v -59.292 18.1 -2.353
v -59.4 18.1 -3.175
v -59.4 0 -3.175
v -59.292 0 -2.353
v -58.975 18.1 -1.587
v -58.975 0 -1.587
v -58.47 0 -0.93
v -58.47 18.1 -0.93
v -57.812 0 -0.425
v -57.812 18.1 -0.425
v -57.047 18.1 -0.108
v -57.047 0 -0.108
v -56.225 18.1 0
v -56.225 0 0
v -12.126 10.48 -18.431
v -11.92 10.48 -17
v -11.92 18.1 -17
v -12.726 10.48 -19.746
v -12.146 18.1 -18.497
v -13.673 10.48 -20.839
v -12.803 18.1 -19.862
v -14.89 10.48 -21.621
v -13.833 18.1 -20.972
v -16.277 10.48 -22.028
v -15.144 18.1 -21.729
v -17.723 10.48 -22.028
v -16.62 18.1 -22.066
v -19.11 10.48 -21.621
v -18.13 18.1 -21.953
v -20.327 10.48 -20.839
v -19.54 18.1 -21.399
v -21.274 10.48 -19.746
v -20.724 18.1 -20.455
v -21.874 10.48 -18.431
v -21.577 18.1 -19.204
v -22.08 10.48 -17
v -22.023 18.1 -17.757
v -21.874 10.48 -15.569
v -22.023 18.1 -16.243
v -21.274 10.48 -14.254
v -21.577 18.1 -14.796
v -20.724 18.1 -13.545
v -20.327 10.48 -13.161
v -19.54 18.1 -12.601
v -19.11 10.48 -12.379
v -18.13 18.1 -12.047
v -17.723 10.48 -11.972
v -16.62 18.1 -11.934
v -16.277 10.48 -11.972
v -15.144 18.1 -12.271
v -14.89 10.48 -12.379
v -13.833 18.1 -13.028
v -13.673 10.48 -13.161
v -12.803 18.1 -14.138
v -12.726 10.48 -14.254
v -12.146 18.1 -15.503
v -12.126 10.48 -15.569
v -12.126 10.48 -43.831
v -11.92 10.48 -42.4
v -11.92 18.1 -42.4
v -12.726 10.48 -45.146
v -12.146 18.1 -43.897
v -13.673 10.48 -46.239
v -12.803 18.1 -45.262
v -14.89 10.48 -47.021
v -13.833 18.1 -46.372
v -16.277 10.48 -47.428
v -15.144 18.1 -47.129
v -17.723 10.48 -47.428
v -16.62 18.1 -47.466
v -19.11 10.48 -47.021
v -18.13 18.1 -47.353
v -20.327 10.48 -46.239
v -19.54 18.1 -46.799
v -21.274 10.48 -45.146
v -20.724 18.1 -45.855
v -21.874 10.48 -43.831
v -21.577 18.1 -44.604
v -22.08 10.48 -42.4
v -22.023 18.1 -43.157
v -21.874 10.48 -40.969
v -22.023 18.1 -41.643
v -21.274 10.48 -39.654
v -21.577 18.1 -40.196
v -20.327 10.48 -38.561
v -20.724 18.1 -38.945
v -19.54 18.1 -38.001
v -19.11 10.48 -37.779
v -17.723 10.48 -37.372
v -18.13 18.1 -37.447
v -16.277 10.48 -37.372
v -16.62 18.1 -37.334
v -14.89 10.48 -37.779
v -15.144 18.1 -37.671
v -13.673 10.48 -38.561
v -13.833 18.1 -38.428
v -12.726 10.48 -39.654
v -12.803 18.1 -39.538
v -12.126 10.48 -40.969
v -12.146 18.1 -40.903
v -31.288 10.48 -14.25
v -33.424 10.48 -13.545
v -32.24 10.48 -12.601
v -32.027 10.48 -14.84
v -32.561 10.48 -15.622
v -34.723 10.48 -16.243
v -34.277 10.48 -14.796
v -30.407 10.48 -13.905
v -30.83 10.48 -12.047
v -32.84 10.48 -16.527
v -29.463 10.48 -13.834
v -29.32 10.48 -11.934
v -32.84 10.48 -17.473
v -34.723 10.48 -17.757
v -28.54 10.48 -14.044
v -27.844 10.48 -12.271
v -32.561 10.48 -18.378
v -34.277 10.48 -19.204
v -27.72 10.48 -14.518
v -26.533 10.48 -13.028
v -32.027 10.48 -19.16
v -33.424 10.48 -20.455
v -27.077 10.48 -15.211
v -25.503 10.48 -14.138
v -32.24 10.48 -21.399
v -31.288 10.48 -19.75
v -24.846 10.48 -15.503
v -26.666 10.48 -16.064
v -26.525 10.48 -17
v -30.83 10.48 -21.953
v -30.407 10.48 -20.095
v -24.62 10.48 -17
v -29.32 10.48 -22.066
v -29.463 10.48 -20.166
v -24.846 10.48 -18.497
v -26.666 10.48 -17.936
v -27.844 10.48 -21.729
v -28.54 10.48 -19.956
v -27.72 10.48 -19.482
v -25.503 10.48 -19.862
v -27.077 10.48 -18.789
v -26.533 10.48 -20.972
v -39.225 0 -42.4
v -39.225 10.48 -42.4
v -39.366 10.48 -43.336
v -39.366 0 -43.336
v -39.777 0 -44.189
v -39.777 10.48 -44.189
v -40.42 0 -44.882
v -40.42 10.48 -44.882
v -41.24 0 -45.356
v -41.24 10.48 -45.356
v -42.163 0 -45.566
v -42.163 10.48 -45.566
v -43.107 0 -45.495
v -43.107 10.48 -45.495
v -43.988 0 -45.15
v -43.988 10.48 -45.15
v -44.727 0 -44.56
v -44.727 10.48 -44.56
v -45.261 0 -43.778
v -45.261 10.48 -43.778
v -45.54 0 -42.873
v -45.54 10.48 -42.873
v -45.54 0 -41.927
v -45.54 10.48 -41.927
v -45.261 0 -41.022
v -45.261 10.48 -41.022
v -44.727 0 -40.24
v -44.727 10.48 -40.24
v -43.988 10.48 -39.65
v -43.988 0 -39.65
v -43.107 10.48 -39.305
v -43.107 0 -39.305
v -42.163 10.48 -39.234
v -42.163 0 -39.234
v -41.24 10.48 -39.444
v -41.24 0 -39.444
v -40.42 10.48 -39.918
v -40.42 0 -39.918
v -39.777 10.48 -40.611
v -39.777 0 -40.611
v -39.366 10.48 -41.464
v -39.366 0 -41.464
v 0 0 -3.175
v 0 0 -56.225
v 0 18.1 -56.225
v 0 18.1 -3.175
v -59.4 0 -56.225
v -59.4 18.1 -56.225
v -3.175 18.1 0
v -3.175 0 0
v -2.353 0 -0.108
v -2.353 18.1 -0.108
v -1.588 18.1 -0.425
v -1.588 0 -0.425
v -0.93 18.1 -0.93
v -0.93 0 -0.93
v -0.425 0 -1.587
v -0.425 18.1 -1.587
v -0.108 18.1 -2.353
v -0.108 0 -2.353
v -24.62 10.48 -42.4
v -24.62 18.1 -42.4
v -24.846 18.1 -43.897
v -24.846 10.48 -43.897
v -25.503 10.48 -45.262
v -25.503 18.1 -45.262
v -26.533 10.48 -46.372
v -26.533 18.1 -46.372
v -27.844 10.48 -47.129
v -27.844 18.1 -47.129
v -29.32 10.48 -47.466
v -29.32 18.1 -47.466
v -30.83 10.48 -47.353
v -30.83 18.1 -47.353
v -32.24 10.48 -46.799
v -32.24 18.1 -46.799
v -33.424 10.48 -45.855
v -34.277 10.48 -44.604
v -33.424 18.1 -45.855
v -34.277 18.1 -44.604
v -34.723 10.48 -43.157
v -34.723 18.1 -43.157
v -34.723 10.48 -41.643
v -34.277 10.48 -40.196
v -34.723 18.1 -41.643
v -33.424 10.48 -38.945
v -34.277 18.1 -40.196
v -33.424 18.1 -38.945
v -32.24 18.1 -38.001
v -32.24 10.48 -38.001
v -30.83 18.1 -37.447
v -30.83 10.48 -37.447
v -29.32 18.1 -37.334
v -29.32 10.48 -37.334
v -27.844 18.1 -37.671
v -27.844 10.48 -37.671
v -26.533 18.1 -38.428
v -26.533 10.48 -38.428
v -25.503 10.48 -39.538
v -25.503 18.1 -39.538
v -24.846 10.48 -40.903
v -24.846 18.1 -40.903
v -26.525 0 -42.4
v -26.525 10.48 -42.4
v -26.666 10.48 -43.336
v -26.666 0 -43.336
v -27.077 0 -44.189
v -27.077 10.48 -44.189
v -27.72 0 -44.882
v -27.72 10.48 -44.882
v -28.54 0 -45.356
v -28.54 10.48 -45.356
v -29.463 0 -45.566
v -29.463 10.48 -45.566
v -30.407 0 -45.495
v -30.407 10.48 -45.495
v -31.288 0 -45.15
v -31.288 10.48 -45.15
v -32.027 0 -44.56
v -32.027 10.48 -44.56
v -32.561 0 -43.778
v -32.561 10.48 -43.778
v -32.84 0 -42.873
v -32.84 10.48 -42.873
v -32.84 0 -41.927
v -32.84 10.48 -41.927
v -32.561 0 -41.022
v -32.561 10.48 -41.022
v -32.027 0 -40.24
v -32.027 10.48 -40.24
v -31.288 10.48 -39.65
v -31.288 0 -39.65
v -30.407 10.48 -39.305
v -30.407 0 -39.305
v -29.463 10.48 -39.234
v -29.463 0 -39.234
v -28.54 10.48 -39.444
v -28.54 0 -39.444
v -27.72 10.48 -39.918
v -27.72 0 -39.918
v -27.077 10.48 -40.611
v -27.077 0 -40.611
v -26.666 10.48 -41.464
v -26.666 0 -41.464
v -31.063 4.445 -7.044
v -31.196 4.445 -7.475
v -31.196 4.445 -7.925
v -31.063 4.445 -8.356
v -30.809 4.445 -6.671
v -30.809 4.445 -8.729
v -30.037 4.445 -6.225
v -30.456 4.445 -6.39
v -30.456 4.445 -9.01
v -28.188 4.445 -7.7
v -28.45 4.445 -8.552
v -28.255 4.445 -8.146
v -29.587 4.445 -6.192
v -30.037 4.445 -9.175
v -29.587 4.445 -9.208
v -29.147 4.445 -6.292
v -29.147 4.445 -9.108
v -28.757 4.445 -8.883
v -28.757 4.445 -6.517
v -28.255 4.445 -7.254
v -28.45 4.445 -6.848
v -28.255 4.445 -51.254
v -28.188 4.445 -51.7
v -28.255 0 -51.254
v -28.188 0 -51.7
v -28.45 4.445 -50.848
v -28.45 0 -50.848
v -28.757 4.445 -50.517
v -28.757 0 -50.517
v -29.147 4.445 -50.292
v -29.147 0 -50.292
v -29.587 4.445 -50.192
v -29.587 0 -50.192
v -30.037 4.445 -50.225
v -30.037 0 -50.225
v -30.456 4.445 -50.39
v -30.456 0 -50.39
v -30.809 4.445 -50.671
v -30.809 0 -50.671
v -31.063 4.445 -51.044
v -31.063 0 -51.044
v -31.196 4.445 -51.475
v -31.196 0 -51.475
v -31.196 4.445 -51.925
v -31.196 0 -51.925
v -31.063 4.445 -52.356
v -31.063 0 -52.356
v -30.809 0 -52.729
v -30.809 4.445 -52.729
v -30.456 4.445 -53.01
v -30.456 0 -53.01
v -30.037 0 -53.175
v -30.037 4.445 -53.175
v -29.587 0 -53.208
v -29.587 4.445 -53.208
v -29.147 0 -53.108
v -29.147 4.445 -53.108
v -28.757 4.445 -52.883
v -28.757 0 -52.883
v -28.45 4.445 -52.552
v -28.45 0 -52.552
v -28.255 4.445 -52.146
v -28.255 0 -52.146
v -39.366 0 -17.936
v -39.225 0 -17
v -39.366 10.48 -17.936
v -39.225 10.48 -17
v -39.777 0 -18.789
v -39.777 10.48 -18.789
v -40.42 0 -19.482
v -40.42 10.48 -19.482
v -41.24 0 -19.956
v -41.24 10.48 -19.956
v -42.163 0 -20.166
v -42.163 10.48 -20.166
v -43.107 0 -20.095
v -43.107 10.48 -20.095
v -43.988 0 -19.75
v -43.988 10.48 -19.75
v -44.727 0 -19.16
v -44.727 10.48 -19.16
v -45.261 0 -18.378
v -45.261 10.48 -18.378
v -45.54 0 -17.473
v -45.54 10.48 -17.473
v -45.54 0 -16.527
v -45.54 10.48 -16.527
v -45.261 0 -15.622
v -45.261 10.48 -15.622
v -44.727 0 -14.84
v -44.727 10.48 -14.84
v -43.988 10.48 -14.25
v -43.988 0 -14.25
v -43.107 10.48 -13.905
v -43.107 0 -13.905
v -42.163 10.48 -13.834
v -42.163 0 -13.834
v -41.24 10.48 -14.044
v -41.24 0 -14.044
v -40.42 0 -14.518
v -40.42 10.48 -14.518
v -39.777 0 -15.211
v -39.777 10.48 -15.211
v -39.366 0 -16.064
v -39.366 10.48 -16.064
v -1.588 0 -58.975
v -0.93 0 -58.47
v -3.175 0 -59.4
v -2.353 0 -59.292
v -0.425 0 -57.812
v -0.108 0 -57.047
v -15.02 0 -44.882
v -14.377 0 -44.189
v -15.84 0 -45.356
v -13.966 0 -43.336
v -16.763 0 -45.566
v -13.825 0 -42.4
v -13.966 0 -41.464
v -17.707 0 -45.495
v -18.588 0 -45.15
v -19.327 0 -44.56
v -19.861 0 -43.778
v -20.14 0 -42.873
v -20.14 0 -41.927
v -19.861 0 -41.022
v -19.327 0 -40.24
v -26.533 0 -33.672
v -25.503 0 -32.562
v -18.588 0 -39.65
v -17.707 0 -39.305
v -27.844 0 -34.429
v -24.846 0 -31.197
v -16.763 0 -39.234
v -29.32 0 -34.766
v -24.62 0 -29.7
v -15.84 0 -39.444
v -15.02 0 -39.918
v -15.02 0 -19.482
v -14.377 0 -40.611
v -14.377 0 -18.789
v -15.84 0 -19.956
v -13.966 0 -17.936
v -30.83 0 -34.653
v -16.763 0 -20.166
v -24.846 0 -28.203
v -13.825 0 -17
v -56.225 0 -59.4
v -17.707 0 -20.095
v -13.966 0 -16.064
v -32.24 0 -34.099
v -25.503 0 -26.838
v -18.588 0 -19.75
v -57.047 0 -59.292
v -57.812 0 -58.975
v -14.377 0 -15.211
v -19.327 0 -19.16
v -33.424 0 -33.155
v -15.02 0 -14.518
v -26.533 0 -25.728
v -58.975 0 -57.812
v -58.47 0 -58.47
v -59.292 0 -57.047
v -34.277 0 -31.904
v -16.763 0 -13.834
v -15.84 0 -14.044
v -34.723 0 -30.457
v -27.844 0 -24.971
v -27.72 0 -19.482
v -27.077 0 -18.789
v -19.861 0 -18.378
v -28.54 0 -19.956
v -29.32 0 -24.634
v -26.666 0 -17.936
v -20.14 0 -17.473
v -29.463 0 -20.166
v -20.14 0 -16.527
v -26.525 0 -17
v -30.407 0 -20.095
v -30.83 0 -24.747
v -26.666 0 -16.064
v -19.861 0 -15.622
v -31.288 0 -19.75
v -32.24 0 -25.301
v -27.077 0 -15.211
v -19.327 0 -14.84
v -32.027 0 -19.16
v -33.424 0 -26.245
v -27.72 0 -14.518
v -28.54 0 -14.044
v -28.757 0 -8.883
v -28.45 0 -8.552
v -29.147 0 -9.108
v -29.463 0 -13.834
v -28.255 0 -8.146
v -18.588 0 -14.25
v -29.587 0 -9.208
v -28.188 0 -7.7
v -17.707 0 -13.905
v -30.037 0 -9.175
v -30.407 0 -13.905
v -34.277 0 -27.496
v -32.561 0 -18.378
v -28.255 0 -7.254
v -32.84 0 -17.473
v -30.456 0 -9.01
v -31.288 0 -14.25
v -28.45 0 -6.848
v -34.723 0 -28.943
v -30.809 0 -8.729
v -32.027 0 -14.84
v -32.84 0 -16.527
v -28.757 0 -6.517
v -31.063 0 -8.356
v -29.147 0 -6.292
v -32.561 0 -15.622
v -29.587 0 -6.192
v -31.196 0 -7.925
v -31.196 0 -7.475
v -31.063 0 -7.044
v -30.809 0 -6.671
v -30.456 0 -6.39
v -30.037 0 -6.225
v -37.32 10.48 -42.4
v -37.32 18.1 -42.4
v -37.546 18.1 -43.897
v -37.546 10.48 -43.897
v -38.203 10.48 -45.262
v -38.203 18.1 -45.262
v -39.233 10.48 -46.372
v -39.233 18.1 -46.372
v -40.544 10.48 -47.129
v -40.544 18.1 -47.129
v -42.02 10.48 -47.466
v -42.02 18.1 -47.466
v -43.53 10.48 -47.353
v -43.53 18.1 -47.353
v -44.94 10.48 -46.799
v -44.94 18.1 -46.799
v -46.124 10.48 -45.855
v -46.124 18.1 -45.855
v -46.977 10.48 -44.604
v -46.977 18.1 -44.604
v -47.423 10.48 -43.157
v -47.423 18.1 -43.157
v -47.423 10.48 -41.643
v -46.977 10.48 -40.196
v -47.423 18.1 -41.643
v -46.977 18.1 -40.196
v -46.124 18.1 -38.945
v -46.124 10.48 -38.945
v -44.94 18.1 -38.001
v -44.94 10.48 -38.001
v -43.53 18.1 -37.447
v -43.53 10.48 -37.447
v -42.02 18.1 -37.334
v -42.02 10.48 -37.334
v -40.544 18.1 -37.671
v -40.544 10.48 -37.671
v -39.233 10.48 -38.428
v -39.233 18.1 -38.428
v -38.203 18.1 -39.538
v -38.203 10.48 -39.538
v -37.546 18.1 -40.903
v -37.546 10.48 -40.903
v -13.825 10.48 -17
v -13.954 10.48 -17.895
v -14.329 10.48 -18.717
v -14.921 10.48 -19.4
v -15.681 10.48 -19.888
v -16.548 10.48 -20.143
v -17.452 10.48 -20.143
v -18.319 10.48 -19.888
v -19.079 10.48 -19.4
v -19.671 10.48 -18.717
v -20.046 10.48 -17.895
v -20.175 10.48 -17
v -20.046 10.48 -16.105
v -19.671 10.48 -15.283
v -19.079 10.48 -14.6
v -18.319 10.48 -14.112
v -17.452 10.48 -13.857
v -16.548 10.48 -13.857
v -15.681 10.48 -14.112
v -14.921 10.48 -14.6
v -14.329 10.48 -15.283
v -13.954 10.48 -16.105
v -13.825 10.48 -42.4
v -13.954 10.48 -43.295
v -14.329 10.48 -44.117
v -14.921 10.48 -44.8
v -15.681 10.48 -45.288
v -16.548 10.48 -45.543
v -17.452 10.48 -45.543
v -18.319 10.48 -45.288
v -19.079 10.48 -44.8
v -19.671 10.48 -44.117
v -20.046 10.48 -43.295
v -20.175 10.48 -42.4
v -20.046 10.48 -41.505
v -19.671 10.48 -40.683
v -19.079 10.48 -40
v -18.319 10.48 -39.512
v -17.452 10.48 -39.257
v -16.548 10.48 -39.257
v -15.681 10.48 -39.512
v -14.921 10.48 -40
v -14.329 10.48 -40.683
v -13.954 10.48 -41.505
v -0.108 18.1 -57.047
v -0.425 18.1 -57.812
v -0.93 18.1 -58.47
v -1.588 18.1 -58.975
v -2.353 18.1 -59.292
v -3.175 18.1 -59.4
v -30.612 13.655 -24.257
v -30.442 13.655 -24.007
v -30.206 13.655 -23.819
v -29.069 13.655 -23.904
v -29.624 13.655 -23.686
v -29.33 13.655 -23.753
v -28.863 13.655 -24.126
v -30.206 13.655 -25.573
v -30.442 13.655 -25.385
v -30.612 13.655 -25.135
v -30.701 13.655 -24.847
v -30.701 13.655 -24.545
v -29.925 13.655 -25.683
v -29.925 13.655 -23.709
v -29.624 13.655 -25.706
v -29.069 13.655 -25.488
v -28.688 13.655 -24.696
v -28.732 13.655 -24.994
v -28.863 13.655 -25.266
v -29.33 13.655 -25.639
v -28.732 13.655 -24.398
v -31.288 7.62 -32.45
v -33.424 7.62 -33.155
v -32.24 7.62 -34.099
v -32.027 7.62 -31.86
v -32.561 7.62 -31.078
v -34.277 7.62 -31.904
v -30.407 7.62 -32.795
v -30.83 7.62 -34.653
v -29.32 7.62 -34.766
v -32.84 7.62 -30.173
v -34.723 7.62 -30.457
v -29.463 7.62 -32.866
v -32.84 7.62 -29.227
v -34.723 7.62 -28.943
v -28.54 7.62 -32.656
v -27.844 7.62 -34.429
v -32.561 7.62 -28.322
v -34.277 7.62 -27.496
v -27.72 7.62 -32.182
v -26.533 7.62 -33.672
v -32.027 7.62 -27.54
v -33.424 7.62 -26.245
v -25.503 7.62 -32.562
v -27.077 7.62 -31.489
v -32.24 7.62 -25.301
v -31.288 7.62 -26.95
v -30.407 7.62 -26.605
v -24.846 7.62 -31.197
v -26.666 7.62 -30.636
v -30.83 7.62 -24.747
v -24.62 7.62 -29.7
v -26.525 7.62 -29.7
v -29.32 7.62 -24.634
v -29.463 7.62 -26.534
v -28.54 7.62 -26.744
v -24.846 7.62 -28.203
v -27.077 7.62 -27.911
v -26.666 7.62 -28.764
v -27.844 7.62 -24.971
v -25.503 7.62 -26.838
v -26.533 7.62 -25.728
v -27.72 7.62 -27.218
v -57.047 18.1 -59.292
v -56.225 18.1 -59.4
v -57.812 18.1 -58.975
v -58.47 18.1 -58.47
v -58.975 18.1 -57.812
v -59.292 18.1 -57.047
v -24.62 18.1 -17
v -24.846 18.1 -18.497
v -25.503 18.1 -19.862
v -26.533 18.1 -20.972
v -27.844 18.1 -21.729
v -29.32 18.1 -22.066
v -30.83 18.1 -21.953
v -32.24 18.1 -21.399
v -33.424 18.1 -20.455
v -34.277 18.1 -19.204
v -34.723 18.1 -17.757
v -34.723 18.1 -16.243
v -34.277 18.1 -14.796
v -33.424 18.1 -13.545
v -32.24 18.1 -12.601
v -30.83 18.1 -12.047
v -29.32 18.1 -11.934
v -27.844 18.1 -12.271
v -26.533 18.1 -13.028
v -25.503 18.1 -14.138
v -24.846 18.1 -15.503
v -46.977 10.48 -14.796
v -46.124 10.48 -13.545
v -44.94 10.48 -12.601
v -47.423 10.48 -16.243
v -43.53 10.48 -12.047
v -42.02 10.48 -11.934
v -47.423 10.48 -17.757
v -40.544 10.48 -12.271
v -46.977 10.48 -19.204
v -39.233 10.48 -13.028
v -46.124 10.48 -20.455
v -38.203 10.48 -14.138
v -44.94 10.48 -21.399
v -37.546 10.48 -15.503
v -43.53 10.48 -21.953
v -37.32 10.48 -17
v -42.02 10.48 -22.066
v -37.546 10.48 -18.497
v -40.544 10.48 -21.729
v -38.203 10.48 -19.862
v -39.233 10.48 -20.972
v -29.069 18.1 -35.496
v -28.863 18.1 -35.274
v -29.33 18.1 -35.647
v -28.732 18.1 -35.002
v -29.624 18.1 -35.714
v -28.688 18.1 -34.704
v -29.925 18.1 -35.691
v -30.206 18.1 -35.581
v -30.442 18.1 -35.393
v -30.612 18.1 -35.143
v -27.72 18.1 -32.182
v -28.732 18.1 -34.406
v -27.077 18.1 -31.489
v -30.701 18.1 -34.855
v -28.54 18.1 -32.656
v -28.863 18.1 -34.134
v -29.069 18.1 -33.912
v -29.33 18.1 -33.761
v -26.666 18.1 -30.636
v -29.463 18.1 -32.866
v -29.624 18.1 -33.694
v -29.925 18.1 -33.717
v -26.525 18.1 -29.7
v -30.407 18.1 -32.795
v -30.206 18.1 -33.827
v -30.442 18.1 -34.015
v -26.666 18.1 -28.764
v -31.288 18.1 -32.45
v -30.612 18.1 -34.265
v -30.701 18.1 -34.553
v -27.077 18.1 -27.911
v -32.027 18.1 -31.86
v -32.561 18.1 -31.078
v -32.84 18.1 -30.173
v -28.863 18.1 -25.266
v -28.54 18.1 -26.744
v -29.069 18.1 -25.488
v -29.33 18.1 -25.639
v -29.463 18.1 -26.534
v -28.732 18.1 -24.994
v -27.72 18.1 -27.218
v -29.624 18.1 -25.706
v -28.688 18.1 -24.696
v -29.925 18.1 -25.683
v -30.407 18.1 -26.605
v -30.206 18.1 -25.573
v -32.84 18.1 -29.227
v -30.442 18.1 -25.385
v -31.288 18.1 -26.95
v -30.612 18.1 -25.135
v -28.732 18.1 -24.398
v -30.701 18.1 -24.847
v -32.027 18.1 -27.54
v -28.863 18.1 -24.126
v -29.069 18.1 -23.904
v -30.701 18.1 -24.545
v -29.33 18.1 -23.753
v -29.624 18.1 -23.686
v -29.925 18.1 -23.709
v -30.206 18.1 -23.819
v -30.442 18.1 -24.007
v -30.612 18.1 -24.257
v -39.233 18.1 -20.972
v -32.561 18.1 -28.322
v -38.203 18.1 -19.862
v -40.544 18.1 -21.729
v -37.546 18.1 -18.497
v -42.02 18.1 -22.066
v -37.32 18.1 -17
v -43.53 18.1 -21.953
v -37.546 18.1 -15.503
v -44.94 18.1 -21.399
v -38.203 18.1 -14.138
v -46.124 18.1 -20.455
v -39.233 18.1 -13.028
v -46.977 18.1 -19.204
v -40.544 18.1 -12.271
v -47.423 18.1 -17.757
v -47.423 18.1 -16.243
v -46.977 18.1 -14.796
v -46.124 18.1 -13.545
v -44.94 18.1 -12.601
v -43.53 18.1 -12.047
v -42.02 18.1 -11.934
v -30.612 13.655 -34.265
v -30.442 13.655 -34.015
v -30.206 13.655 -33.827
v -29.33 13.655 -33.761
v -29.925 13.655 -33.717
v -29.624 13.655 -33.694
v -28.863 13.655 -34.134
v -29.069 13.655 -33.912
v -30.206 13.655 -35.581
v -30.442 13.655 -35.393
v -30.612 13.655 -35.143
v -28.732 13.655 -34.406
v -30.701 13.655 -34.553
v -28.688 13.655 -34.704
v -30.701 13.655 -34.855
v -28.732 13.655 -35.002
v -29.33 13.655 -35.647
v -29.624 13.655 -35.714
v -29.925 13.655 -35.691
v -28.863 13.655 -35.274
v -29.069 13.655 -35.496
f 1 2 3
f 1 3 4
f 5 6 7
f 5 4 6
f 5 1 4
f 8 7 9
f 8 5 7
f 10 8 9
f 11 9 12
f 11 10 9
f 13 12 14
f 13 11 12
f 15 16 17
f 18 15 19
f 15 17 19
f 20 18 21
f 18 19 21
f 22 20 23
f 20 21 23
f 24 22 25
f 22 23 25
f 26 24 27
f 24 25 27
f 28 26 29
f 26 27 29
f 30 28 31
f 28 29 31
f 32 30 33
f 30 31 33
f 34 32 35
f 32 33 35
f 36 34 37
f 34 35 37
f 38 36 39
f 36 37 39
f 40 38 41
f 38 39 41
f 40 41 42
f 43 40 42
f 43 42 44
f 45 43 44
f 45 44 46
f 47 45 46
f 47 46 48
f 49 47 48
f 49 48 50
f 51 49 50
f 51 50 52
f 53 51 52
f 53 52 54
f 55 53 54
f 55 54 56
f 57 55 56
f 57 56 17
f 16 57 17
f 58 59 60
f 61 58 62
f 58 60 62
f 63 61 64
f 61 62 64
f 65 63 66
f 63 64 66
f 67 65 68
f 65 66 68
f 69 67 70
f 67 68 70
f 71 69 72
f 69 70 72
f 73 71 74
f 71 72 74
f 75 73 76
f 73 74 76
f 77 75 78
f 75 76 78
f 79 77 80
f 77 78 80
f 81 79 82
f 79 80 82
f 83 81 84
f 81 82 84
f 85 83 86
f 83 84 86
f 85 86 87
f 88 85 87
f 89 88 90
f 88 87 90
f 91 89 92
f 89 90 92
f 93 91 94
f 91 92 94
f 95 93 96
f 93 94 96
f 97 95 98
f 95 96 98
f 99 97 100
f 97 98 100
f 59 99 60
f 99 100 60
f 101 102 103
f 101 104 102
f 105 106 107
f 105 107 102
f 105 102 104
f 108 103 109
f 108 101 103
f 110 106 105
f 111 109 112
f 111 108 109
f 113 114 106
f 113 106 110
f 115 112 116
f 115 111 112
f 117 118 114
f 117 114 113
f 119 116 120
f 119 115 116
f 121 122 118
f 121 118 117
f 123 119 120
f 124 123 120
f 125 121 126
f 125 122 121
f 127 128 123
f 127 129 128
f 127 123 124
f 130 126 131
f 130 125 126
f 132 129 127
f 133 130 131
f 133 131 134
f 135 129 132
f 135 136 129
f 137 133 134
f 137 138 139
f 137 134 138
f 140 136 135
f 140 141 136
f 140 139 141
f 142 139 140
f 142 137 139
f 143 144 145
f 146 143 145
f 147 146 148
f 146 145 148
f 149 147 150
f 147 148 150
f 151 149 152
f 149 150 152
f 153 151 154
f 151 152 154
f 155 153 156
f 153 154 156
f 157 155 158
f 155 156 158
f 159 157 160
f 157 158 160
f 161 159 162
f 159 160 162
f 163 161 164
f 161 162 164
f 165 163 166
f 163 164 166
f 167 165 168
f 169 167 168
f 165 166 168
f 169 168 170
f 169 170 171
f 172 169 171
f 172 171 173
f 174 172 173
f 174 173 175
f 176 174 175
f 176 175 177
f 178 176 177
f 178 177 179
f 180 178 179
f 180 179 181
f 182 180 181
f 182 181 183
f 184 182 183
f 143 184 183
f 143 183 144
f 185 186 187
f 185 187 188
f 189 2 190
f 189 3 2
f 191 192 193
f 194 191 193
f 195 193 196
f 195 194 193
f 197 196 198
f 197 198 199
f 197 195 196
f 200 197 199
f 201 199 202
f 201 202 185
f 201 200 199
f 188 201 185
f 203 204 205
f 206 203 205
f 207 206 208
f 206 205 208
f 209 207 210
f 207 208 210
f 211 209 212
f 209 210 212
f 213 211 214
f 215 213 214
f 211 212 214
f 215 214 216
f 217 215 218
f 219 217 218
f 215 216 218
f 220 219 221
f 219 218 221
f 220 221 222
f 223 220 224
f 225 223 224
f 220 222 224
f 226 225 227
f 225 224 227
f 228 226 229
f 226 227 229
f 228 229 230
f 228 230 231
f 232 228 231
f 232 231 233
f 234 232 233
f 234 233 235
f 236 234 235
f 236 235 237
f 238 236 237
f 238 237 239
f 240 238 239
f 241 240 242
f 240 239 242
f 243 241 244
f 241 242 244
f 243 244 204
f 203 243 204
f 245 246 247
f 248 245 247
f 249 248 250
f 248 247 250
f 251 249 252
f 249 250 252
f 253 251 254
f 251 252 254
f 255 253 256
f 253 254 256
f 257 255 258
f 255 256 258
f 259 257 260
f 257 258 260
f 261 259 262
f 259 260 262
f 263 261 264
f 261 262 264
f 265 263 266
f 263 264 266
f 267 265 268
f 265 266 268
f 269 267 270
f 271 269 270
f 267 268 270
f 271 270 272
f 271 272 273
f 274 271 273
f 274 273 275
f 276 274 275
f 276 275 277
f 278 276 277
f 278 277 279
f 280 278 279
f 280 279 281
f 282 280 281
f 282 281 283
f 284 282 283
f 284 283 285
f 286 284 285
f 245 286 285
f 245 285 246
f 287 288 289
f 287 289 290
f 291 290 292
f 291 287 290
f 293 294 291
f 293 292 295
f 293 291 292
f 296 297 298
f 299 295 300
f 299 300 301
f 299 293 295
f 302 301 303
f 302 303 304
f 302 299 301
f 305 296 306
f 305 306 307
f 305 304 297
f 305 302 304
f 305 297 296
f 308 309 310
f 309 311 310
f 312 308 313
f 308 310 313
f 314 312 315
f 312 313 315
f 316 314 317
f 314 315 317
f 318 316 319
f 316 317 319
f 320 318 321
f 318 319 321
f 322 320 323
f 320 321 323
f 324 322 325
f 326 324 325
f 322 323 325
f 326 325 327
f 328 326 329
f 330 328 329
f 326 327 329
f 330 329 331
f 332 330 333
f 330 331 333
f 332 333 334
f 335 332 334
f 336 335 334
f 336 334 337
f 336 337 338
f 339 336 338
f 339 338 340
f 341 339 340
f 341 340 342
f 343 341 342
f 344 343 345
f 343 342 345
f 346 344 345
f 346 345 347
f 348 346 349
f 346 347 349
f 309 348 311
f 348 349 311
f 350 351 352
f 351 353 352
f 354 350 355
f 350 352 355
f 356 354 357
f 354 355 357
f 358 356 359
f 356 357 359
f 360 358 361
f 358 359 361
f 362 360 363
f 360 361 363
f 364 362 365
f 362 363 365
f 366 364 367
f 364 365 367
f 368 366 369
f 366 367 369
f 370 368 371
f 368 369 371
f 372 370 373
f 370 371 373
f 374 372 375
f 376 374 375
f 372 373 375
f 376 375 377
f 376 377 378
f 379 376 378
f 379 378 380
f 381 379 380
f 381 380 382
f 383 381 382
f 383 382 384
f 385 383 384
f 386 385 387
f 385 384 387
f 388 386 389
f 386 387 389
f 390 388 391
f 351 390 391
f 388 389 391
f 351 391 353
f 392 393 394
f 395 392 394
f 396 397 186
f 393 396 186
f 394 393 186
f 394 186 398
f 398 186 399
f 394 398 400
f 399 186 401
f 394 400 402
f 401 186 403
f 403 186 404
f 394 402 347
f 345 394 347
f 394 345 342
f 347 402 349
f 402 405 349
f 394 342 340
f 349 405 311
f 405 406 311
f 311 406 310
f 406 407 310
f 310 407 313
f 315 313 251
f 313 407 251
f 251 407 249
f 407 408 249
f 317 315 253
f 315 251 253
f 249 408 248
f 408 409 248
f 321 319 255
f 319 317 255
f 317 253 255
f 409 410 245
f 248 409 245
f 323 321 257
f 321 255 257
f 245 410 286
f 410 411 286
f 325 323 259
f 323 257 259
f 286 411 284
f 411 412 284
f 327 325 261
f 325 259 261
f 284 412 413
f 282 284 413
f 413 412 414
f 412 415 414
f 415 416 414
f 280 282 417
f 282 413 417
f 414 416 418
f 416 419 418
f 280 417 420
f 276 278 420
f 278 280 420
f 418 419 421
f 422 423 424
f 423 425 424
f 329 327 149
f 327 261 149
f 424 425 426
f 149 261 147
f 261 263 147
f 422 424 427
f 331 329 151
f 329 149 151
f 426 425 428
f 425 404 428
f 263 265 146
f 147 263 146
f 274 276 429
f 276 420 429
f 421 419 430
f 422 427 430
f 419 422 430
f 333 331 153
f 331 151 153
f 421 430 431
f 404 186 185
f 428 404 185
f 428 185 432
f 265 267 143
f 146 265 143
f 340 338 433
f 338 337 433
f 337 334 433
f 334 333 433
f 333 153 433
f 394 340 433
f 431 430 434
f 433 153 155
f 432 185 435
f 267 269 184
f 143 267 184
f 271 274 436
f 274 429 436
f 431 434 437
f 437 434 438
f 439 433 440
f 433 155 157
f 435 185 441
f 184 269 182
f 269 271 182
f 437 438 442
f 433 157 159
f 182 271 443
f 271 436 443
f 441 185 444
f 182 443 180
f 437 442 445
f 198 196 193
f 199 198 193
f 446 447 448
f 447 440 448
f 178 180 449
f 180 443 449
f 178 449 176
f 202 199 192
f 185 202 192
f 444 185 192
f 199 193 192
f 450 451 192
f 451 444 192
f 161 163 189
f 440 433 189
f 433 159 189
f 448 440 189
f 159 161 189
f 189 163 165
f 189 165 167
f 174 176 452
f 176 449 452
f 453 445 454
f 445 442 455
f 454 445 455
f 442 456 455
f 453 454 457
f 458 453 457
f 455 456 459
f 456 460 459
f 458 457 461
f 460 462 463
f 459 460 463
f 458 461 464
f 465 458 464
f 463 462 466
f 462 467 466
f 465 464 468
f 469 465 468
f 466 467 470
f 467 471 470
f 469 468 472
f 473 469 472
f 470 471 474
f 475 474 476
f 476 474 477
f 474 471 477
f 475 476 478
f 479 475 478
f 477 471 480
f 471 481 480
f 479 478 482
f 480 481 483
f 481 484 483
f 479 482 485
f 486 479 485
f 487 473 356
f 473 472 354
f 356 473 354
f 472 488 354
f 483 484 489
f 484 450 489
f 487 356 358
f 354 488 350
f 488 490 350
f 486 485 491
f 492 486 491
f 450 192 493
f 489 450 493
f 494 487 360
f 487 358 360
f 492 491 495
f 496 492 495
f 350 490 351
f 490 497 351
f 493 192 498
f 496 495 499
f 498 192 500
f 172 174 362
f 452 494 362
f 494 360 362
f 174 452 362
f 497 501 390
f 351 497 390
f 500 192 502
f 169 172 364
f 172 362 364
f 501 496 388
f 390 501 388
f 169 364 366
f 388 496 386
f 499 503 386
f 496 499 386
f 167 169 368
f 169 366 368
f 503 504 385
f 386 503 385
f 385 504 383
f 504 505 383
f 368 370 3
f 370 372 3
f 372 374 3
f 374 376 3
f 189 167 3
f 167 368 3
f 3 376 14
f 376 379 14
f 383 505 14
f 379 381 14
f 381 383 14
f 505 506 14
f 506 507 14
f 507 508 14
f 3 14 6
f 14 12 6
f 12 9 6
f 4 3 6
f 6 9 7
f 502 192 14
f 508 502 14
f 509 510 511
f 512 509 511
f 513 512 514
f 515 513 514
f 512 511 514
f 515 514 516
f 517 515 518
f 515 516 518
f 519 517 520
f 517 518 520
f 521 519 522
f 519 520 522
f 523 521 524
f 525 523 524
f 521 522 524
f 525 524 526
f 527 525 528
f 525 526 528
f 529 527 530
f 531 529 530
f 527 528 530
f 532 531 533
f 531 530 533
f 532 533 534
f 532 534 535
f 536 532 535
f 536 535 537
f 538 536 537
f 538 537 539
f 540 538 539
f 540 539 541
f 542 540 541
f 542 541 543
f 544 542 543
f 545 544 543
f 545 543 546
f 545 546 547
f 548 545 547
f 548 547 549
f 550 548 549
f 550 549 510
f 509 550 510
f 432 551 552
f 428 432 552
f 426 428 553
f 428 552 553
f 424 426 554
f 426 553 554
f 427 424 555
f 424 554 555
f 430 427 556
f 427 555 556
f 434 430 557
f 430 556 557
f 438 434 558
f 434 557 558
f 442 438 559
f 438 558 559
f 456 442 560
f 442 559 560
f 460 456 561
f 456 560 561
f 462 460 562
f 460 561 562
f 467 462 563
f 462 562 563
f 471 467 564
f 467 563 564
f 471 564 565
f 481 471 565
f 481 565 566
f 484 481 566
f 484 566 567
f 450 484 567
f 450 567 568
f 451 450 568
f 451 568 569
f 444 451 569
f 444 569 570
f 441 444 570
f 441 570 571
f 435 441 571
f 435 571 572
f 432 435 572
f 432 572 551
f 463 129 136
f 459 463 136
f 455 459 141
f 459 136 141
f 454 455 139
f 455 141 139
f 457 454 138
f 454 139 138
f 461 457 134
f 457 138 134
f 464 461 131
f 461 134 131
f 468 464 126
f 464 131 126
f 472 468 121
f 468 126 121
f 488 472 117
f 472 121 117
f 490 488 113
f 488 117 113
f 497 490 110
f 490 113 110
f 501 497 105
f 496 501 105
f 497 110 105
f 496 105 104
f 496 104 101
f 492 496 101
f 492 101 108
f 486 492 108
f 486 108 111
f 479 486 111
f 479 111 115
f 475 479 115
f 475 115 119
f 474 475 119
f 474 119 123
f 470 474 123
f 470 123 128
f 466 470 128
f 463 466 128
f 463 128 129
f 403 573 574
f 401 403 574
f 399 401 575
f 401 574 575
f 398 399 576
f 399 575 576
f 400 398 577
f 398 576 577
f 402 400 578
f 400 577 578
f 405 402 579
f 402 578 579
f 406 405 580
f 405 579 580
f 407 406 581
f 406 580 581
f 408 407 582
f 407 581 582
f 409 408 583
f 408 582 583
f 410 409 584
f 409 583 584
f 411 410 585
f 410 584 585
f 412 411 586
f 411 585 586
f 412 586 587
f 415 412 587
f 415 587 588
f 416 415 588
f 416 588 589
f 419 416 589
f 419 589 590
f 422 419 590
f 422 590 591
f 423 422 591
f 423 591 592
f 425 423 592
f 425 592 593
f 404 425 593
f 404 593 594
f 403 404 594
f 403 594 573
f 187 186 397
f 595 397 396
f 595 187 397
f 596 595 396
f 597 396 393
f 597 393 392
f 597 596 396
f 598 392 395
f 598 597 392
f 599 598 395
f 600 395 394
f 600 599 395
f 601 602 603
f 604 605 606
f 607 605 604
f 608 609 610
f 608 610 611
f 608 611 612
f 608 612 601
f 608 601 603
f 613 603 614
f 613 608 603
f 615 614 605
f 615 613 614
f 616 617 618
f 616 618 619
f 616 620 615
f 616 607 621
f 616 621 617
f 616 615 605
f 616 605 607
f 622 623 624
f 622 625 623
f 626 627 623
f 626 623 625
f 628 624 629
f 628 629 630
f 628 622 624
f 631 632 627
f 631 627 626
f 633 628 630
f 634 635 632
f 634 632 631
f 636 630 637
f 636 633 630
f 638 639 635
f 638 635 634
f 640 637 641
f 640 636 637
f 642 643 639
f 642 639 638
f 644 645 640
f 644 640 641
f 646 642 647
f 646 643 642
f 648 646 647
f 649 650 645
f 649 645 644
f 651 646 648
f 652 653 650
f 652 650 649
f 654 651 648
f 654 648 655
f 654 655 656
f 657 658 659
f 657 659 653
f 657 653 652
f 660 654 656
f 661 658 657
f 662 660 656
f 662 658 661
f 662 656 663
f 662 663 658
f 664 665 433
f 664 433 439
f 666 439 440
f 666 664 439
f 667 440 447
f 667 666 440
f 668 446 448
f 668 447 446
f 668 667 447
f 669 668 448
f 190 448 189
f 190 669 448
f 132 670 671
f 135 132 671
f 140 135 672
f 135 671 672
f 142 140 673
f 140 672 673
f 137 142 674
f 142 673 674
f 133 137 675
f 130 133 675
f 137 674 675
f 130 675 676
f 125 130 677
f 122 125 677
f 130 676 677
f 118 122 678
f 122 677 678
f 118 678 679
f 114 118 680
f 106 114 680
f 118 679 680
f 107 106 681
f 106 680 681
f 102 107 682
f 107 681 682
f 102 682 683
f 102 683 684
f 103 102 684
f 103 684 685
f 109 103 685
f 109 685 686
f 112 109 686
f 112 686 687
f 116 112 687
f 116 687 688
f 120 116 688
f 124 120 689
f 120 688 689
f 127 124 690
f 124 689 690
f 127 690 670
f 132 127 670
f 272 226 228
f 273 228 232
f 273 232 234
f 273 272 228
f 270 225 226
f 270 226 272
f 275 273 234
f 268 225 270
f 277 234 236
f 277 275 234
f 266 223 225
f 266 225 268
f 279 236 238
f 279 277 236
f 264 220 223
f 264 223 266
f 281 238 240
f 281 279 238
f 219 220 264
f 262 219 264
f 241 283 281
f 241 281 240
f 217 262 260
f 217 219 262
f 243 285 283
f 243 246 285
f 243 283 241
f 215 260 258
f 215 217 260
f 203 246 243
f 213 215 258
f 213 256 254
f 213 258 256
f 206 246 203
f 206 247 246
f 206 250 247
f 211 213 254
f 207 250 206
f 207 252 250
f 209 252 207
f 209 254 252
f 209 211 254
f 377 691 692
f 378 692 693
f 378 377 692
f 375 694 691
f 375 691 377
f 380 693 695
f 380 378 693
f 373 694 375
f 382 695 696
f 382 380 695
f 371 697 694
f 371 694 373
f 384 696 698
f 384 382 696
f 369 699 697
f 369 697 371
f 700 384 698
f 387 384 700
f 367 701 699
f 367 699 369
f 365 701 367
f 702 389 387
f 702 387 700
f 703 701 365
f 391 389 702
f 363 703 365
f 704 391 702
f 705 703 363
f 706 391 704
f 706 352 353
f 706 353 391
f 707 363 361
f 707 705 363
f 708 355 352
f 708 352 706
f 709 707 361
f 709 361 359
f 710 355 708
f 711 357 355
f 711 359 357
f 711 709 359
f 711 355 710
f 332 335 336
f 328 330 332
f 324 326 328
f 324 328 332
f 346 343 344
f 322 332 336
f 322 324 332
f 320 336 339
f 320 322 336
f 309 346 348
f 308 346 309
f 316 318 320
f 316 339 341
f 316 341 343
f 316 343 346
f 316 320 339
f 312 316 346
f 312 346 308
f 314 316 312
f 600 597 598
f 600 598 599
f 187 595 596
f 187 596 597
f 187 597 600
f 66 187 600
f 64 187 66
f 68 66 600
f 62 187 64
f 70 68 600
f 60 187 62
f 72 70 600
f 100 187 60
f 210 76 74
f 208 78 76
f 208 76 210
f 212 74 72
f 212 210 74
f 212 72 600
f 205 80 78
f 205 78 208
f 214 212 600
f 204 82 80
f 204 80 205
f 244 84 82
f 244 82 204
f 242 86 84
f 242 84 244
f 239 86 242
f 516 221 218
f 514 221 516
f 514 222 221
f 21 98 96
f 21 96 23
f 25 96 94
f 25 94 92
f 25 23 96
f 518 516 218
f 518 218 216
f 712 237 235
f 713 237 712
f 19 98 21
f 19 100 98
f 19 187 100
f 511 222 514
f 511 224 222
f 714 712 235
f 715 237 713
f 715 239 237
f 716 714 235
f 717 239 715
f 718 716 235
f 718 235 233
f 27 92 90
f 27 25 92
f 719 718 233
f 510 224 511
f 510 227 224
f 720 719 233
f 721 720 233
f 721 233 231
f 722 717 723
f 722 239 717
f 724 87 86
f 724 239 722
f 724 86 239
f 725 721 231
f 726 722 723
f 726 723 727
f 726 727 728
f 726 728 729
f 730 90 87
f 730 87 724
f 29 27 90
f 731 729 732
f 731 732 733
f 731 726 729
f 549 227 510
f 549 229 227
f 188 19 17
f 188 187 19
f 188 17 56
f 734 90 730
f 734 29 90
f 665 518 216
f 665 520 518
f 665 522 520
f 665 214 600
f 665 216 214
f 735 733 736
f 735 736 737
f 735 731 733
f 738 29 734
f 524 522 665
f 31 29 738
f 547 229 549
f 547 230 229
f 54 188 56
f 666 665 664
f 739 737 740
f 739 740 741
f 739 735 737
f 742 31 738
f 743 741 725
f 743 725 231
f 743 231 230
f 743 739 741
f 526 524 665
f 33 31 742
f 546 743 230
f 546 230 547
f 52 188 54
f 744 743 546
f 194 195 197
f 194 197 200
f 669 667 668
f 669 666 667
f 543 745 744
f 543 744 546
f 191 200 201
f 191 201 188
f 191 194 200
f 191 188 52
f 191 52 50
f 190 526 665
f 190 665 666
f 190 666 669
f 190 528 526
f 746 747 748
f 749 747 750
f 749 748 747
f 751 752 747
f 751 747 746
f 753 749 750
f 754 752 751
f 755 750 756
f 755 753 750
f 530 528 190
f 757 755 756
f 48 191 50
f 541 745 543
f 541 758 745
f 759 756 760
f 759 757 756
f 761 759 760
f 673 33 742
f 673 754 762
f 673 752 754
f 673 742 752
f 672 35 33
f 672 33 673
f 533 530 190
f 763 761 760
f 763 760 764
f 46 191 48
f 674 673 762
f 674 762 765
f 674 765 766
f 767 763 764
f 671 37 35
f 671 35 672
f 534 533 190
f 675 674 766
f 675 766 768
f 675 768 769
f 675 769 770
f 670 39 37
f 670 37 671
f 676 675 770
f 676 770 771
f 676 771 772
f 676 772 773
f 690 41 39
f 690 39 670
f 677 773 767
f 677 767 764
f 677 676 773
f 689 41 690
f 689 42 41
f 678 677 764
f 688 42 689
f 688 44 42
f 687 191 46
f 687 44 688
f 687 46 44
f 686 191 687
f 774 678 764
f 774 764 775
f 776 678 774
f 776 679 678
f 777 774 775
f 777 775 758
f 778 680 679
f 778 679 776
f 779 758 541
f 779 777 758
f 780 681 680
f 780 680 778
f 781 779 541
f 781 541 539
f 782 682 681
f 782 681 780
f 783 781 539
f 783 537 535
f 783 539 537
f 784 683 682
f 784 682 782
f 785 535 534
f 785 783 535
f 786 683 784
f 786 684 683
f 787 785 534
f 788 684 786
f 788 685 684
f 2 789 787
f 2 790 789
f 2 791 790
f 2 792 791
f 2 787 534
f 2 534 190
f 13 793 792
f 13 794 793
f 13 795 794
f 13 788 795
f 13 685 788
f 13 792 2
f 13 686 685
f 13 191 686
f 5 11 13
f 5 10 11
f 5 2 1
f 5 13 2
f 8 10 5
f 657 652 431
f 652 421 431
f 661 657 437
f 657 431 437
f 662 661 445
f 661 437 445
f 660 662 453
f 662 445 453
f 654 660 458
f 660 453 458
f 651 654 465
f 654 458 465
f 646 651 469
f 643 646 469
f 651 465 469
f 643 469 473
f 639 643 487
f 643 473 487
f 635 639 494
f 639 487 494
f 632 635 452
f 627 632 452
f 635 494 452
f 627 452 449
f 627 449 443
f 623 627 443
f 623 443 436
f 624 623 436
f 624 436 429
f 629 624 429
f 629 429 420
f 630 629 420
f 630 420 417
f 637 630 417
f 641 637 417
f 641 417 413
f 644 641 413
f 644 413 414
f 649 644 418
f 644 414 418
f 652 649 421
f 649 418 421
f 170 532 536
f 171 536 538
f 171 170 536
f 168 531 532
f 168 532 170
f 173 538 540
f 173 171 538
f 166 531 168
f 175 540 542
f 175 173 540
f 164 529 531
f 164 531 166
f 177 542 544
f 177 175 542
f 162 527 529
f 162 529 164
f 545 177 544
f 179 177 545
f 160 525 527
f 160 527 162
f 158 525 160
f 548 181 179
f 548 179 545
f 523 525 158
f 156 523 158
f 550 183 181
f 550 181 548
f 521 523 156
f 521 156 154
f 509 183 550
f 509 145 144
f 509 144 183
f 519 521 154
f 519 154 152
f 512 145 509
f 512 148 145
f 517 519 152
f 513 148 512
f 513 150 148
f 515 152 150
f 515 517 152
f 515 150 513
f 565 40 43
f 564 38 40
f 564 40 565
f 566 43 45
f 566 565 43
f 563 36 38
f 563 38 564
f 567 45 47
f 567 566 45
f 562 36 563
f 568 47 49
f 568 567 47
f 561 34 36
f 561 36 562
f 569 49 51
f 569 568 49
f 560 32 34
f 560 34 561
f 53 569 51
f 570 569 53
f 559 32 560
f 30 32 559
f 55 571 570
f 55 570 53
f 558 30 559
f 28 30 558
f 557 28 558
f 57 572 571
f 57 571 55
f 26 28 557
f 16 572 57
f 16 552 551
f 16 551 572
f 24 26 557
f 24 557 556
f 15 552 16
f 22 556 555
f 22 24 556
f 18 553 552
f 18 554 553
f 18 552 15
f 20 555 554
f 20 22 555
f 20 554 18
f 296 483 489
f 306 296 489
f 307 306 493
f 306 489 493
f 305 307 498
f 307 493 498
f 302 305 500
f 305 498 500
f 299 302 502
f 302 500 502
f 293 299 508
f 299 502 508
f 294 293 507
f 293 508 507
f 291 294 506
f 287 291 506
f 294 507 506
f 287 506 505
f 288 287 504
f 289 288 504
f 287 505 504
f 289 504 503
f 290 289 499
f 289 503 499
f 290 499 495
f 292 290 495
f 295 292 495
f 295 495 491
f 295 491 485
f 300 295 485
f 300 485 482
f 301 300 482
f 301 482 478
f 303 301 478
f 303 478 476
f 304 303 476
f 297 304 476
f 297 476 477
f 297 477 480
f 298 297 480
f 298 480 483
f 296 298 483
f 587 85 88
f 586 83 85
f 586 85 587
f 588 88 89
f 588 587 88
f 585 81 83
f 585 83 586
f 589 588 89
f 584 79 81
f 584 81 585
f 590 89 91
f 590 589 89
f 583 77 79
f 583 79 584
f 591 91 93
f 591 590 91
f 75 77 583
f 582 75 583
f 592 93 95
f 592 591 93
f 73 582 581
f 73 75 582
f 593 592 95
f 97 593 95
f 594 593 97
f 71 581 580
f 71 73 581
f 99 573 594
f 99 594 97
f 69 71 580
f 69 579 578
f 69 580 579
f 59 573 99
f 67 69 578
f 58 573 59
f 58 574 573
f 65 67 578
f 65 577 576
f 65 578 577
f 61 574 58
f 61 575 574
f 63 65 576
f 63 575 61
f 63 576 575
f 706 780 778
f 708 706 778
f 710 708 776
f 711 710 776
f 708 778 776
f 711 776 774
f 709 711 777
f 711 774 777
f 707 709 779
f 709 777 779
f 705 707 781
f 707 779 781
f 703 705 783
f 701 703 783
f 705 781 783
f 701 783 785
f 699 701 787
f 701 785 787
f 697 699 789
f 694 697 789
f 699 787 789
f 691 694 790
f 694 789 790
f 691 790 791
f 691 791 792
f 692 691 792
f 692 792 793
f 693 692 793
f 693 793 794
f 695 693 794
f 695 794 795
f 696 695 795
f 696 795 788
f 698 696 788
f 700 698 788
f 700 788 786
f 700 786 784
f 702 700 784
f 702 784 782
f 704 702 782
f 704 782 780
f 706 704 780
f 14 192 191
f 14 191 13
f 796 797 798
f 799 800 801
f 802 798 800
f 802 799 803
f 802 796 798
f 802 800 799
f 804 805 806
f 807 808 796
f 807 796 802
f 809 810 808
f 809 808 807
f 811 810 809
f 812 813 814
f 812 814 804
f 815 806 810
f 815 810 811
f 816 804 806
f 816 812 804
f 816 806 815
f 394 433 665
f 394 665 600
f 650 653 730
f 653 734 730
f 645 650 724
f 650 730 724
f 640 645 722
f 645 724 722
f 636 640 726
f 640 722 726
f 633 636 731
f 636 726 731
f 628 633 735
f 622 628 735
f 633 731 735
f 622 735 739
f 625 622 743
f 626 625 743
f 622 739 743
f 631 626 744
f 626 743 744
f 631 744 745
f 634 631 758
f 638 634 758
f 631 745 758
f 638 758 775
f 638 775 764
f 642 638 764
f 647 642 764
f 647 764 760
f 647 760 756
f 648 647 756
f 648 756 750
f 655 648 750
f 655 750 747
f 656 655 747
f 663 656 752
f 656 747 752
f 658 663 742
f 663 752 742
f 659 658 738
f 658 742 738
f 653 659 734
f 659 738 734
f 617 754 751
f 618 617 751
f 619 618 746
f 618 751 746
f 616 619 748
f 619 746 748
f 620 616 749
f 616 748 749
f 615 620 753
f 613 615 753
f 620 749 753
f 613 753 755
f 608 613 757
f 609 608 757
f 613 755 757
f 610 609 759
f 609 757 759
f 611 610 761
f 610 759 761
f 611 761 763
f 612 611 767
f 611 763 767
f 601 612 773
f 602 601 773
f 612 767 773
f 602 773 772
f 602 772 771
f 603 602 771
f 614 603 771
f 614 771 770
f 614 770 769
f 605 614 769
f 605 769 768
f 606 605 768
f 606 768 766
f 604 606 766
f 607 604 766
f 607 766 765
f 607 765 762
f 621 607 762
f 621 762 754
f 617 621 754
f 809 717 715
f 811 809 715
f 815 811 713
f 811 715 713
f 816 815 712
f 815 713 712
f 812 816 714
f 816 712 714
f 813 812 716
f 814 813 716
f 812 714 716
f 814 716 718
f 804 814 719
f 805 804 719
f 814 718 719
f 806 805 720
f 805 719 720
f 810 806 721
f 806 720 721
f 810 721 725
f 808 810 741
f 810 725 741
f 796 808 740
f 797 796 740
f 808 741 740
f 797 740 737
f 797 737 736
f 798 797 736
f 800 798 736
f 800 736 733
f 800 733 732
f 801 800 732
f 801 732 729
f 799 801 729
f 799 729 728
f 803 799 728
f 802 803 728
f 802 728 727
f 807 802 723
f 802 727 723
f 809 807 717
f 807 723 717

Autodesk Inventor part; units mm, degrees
ref_plane "YZ Plane" through (0, 0, 0) normal (1, 0, 0) x (0, 1, 0)
ref_plane "XZ Plane" through (0, 0, 0) normal (0, 1, 0) x (-1, 0, 0)
ref_plane "XY Plane" through (0, 0, 0) normal (0, 0, 1) x (1, 0, 0)
sketch "Sketch1" plane through (0, 0, 0) normal (0, 1, 0) x (-1, 0, 0)
  line L0 (0, 0) -> (59.4, 0)
  line L1 (59.4, 0) -> (59.4, -59.4)
  line L2 (59.4, -59.4) -> (0, -59.4)
  line L3 (0, -59.4) -> (0, 0)
  dimension "d0" = 59.4
  dimension "d1" = 59.4
extrude "Extrusion1" add sketch "Sketch1" along normal blind 18.1
sketch "Sketch2" plane through (0, 18.1, 0) normal (0, 1, 0) x (1, 0, 0)
  line L0 (-59.4, 59.4) -> (-59.4, 0) projected
  line L1 (-59.4, 29.7) -> (0, 29.7)
  line L2 (-29.7, 29.7) -> (-29.7, 59.4)
  line L3 (-29.7, 29.7) -> (-29.7, 17)
  circle A0 centre (-29.7, 17) radius 5.08
  line L4 (-29.7, 17) -> (-42.4, 17)
  line L5 (-29.7, 17) -> (-17, 17)
  circle A1 centre (-42.4, 17) radius 5.08
  circle A2 centre (-17, 17) radius 5.08
  line L6 (-29.7, 29.7) -> (-29.7, 42.4)
  circle A3 centre (-29.7, 42.4) radius 5.08
  line L7 (-29.7, 42.4) -> (-42.4, 42.4)
  line L8 (-29.7, 42.4) -> (-17, 42.4)
  circle A4 centre (-42.4, 42.4) radius 5.08
  circle A5 centre (-17, 42.4) radius 5.08
  circle A6 centre (-29.7, 17) radius 3.175
  circle A7 centre (-42.4, 17) radius 3.175
  circle A8 centre (-17, 17) radius 3.175
  circle A9 centre (-29.7, 42.4) radius 3.175
  circle A10 centre (-42.4, 42.4) radius 3.175
  circle A11 centre (-17, 42.4) radius 3.175
  circle A12 centre (-29.7, 29.7) radius 3.175
  line L9 (-29.7, 29.7) -> (-29.7, 34.704)
  line L10 (-29.7, 29.7) -> (-29.7, 24.696)
  circle A13 centre (-29.7, 24.696) radius 1.0125
  circle A14 centre (-29.7, 34.704) radius 1.0125
  point P0 (0, 0)
  dimension "d4" = 12.7
  dimension "d5" = 10.16
  dimension "d6" = 12.7
  dimension "d7" = 12.7
  dimension "d8" = 10.16
  dimension "d9" = 10.16
  dimension "d10" = 12.7
  dimension "d11" = 10.16
  dimension "d12" = 12.7
  dimension "d13" = 12.7
  dimension "d14" = 10.16
  dimension "d15" = 10.16
  dimension "d16" = 6.35
  dimension "d17" = 6.35
  dimension "d18" = 6.35
  dimension "d19" = 6.35
  dimension "d20" = 6.35
  dimension "d21" = 6.35
  dimension "d22" = 6.35
  dimension "d23" = 5.004
  dimension "d24" = 5.004
  dimension "d25" = 2.025
  dimension "d26" = 2.025
extrude "Extrusion2" cut sketch "Sketch2" against normal blind 38.1 contours L2 A12 L1 | L3 A12 L1 | L1 A12 L2 | L1 A12 L3 | A8 | A7 | A10 | A11 | A9 L7 L2 | L2 L8 A9 | A6 L5 L3 | L3 L4 A6 | L7 A9 L2 | L2 A9 L8 | L5 A6 L4
extrude "Extrusion3" cut sketch "Sketch2" against normal blind 7.62 contours A8 | A2 | A7 | A1 | A0 L5 A6 L3 | L3 A6 L4 A0 | A4 | A11 | A5 | A3 L7 A9 L2 | L2 A9 L8 A3 | A9 L7 L2 | L2 L8 A9 | A3 L2 A9 L7 | L8 A9 L2 A3 | A6 L5 L3 | L3 L4 A6 | A0 L4 A6 L5 | L7 A9 L2 | L2 A9 L8 | L5 A6 L4
extrude "Extrusion4" cut sketch "Sketch2" against normal blind 4.445 contours A13 L3 | L3 A13 | A14 L2 | L2 A14
sketch "Sketch3" plane through (0, 0, 0) normal (0, -1, 0) x (1, 0, 0)
  circle A0 centre (-29.7, -29.7) radius 3.175 projected
  line L0 (-29.7, -29.7) -> (-29.7, -51.7)
  line L1 (-29.7, -29.7) -> (-29.7, -7.7)
  circle A1 centre (-29.7, -7.7) radius 1.5125
  circle A2 centre (-29.7, -51.7) radius 1.5125
  circle A3 centre (-29.7, -29.7) radius 5.08
  point P0 (0, 0)
  dimension "d33" = 22
  dimension "d34" = 22
  dimension "d35" = 3.025
  dimension "d36" = 3.025
  dimension "d37" = 10.16
extrude "Extrusion5" cut sketch "Sketch3" against normal blind 4.445 contours A1 | A2
extrude "Extrusion6" cut sketch "Sketch3" against normal blind 7.62 contours A0 L0 L1 | A0 L1 A3 L0 | L1 L0 A0 | A0 L0 A3 L1
fillet "Fillet1" radius 3.175 4 edges at (0, 9.05, -59.4) (0, 9.05, 0) (-59.4, 9.05, 0) (-59.4, 9.05, -59.4)
properties part number "LNR25MtoPolarisAdapter"
